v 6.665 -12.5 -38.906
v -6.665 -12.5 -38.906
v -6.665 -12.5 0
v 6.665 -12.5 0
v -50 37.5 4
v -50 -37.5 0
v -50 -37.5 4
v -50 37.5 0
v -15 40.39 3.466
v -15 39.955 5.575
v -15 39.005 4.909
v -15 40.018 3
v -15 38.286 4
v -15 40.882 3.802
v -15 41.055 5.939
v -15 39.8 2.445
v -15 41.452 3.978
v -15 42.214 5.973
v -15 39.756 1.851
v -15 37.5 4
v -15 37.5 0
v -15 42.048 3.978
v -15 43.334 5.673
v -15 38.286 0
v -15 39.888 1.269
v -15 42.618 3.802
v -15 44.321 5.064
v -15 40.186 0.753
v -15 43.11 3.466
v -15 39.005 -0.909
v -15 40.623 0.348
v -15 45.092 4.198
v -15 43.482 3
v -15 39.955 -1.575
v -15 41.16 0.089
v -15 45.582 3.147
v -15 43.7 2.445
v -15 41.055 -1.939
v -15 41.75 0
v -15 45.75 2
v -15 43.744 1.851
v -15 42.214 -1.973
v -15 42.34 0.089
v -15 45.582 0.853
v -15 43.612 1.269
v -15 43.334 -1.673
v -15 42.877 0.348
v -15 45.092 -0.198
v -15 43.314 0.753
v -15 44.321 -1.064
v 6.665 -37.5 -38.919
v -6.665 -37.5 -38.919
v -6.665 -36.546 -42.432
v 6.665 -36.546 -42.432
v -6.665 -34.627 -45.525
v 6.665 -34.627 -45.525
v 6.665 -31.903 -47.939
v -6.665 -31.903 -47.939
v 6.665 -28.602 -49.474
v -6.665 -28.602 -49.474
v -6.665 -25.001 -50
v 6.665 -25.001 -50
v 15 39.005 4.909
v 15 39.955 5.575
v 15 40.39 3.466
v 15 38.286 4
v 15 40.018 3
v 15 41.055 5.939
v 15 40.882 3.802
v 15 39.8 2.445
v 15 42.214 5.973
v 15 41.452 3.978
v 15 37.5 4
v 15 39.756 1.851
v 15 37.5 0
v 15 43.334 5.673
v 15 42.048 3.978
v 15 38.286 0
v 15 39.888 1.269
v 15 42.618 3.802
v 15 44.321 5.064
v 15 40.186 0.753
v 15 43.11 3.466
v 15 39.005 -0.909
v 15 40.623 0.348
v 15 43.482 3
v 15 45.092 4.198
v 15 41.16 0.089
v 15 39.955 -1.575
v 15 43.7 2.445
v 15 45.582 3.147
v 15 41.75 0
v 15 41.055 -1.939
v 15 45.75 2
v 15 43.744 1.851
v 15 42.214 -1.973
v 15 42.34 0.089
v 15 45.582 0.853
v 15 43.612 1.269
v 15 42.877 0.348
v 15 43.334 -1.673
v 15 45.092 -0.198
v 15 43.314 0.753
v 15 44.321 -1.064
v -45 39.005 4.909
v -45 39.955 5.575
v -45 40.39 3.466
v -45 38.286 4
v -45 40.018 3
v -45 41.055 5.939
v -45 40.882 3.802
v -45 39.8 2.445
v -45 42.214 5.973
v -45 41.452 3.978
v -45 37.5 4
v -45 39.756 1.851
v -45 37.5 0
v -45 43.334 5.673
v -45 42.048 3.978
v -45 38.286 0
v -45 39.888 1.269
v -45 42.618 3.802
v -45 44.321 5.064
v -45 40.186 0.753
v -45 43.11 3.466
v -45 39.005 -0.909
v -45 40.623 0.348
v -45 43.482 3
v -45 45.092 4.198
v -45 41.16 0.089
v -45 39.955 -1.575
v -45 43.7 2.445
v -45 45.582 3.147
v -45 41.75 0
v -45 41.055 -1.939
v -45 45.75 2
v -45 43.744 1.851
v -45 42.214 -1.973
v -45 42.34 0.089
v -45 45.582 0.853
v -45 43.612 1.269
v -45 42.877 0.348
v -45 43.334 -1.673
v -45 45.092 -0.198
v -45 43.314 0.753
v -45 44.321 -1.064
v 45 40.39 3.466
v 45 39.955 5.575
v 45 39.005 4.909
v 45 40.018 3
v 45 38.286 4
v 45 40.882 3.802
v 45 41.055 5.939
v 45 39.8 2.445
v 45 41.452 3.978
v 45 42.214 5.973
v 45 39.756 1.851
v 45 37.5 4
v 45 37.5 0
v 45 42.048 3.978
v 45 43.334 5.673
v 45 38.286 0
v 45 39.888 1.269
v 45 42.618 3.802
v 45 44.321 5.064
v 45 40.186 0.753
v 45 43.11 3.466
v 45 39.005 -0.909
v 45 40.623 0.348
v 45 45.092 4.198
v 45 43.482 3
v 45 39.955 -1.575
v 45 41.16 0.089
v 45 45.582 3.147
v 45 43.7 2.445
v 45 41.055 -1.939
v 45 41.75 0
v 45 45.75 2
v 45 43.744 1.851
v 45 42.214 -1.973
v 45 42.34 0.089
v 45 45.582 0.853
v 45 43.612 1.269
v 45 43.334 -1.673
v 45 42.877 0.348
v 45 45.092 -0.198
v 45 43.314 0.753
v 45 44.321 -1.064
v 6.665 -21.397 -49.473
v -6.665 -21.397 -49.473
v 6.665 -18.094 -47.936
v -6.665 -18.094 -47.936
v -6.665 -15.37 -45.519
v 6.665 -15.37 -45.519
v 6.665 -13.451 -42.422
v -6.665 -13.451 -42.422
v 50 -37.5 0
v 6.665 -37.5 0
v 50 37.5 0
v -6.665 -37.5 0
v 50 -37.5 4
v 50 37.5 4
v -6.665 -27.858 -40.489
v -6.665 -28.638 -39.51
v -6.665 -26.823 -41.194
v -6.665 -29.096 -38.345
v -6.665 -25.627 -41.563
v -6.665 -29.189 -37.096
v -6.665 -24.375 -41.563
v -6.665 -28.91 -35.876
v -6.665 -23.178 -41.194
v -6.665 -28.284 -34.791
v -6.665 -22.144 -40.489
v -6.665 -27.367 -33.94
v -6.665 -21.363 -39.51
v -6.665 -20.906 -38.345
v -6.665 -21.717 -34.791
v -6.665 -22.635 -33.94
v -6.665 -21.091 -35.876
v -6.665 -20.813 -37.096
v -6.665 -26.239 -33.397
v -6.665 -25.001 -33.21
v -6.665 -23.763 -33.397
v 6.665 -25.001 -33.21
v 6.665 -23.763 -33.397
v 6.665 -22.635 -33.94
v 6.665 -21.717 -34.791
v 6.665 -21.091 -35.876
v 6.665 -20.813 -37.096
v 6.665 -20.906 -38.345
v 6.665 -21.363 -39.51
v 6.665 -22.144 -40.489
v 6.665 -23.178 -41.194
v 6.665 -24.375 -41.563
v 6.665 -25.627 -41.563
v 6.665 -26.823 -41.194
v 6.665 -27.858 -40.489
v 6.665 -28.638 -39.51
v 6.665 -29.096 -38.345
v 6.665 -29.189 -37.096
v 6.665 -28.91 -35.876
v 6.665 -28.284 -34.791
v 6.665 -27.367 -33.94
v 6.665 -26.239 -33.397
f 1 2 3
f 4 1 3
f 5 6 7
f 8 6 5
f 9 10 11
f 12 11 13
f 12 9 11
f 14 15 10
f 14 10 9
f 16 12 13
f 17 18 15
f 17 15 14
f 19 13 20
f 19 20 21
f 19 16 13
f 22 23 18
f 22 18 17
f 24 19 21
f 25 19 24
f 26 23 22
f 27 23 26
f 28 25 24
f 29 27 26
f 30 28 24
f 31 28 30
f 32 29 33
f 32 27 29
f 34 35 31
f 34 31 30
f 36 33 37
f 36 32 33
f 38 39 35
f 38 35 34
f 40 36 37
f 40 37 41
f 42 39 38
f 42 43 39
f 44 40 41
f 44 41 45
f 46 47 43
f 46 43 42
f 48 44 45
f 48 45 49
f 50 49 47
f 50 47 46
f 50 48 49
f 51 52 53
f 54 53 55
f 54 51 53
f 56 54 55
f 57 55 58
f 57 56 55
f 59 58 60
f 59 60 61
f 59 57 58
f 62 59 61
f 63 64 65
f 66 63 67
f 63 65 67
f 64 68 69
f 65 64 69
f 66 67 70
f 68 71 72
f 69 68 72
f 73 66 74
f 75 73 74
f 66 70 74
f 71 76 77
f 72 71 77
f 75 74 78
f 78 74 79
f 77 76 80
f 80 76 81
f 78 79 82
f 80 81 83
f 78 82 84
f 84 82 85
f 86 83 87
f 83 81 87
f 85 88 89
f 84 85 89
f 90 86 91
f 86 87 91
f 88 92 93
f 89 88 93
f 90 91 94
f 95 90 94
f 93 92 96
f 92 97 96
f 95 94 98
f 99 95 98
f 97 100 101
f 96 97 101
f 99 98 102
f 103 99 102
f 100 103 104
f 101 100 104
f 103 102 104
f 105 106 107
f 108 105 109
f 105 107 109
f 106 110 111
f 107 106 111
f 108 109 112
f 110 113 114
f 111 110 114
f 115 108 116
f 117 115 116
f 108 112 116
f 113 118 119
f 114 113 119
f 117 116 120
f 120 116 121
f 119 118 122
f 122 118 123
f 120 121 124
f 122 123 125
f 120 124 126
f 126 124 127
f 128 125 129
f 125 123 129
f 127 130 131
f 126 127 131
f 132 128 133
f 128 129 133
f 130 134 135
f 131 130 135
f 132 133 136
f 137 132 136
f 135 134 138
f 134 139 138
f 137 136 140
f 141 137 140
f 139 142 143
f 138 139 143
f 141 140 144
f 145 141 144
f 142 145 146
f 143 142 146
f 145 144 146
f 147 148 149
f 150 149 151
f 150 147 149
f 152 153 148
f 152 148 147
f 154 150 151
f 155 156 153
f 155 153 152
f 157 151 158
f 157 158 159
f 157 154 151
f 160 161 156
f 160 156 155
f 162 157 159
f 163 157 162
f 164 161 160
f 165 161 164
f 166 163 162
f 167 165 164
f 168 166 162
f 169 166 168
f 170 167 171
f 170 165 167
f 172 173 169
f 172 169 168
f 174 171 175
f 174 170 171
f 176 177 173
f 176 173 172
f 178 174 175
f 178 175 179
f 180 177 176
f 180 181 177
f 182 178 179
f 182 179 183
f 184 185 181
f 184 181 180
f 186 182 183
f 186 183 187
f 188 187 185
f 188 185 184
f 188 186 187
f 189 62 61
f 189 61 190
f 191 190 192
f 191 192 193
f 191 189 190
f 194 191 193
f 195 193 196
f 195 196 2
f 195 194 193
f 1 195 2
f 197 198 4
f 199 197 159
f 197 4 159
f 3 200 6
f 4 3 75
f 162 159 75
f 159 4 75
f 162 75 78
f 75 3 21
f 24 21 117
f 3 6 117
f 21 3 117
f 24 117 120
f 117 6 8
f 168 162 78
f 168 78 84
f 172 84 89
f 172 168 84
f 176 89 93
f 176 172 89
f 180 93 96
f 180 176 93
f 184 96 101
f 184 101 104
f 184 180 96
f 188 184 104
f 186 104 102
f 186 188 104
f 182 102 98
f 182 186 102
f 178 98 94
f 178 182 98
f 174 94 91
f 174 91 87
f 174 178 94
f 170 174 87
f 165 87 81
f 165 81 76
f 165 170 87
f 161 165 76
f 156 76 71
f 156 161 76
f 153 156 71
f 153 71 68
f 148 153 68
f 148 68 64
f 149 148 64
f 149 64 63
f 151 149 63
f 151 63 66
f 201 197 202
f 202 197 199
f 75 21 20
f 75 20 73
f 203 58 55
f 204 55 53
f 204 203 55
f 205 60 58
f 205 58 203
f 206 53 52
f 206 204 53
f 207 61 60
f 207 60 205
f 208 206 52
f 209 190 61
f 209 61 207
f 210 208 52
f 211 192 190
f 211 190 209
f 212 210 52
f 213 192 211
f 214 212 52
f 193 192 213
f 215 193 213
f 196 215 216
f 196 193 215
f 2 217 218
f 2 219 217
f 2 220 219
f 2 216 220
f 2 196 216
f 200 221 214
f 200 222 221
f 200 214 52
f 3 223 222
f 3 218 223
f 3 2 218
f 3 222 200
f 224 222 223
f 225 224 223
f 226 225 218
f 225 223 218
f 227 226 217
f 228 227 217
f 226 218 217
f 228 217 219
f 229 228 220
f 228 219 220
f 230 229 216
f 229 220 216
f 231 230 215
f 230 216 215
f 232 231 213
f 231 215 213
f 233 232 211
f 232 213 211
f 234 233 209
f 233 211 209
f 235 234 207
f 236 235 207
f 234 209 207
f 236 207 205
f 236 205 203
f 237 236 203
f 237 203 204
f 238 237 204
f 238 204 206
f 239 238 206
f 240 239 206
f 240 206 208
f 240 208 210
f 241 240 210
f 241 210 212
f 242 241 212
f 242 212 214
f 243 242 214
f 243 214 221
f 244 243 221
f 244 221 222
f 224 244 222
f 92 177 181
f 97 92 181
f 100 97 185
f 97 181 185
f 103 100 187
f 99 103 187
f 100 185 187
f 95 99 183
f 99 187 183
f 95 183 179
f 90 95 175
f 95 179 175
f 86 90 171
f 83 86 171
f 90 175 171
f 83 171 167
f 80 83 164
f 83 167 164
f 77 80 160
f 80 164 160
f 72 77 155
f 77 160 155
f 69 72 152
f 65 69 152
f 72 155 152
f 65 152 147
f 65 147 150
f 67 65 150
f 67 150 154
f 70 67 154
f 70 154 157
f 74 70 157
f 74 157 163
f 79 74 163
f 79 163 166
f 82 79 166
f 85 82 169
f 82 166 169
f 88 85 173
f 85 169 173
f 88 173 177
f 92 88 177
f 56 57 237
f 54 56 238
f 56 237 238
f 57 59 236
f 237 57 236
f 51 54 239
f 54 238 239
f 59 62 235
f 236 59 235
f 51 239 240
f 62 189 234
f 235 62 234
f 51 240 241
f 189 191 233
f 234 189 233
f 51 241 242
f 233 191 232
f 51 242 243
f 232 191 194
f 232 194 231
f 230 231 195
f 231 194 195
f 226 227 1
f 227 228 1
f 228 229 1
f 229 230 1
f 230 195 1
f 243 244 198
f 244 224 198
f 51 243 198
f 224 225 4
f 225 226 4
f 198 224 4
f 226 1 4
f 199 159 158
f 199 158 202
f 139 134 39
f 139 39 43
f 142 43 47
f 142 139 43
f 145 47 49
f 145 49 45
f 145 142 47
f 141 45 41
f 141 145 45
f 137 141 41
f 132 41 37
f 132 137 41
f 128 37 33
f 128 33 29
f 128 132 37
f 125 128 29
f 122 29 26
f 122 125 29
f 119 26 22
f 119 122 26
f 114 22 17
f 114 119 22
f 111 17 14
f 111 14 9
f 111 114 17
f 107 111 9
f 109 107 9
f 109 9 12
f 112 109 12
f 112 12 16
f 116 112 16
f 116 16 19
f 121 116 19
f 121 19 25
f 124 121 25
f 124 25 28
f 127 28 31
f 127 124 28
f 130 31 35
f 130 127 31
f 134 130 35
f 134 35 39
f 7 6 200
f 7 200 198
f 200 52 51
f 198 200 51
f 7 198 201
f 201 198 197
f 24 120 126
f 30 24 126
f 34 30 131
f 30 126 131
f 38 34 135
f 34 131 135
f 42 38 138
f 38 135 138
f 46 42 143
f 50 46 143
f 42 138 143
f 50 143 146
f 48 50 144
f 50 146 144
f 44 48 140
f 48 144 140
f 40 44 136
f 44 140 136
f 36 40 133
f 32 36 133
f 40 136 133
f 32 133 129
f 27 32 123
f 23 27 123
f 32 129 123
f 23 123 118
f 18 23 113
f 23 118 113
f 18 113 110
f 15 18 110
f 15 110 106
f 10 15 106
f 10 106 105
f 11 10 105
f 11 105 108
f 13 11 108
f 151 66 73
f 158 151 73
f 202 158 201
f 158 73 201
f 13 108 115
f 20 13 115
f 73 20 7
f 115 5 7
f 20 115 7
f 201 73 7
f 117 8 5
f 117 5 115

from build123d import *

# Parameters (mm, degrees)
SKETCH1_W           = 100
SKETCH1_H           = 75
BOSS_EXTRUDE1_DEPTH = 4
SKETCH2_R           = 2
BOSS_EXTRUDE2_DEPTH = 30
SKETCH3_W           = 50
SKETCH3_H           = 25
BOSS_EXTRUDE3_DEPTH = 6.665
CUT_EXTRUDE2_START  = -13.33
CUT_EXTRUDE2_DEPTH  = 13.33
SKETCH5_R           = 4.2
CUT_EXTRUDE3_DEPTH  = 89.340164846


# Read off the part's stored shape, not the designer's step: Cut-Extrude2
with BuildPart() as part:
    # Sketch1 → Boss-Extrude1 (new body)
    with BuildSketch(Plane.XY):
        Rectangle(SKETCH1_W, SKETCH1_H)
    extrude(amount=BOSS_EXTRUDE1_DEPTH)

    # Sketch2 → Boss-Extrude2 (add)
    with BuildSketch(Plane(origin=(45, 0, 0), x_dir=(0, 0, -1), z_dir=(1, 0, 0))):
        with BuildLine():
            Line((-4, 38.285898385), (-4, 37.428468659))
            Line((-4, 37.428468659), (0, 37.428468659))
            Line((0, 37.428468659), (0, 38.285898385))
            ThreePointArc((0, 38.285898385), (-2, 45.75), (-4, 38.285898385))
        make_face()
        with Locations((-2, 41.75)):
            Circle(SKETCH2_R, mode=Mode.SUBTRACT)
    boss_extrude2 = extrude(amount=-BOSS_EXTRUDE2_DEPTH)

    # Mirror1: Boss-Extrude2 across plane
    add(boss_extrude2.mirror(Plane.ZY))

    # Sketch3 → Boss-Extrude3 (add, symmetric)
    with BuildSketch(Plane.ZY):
        with Locations((-25, -25)):
            Rectangle(SKETCH3_W, SKETCH3_H)
    extrude(amount=BOSS_EXTRUDE3_DEPTH, both=True)

    # Cut-Extrude2 outline → Cut-Extrude2 (cut)
    with BuildSketch(Plane.ZY.offset(6.665).offset(CUT_EXTRUDE2_START)):
        with BuildLine():
            Line((-50, -37.5), (-38.919370818, -37.5))
            ThreePointArc((-38.919370818, -37.5), (-46.831015832, -33.352603885), (-50, -25.000804036))
            Line((-50, -25.000804036), (-50, -37.5))
        make_face()
        with BuildLine():
            Line((-50, -12.5), (-50, -25.000804036))
            ThreePointArc((-50, -25.000804036), (-46.826545708, -16.643964506), (-38.905994132, -12.5))
            Line((-38.905994132, -12.5), (-50, -12.5))
        make_face()
    extrude(amount=CUT_EXTRUDE2_DEPTH, mode=Mode.SUBTRACT)

    # Sketch5 → Cut-Extrude3 (cut, through all)
    with BuildSketch(Plane.ZY.offset(6.665)):
        with Locations((-37.41, -25.000804036)):
            Circle(SKETCH5_R)
    extrude(amount=-CUT_EXTRUDE3_DEPTH, mode=Mode.SUBTRACT)


solid = part.part
